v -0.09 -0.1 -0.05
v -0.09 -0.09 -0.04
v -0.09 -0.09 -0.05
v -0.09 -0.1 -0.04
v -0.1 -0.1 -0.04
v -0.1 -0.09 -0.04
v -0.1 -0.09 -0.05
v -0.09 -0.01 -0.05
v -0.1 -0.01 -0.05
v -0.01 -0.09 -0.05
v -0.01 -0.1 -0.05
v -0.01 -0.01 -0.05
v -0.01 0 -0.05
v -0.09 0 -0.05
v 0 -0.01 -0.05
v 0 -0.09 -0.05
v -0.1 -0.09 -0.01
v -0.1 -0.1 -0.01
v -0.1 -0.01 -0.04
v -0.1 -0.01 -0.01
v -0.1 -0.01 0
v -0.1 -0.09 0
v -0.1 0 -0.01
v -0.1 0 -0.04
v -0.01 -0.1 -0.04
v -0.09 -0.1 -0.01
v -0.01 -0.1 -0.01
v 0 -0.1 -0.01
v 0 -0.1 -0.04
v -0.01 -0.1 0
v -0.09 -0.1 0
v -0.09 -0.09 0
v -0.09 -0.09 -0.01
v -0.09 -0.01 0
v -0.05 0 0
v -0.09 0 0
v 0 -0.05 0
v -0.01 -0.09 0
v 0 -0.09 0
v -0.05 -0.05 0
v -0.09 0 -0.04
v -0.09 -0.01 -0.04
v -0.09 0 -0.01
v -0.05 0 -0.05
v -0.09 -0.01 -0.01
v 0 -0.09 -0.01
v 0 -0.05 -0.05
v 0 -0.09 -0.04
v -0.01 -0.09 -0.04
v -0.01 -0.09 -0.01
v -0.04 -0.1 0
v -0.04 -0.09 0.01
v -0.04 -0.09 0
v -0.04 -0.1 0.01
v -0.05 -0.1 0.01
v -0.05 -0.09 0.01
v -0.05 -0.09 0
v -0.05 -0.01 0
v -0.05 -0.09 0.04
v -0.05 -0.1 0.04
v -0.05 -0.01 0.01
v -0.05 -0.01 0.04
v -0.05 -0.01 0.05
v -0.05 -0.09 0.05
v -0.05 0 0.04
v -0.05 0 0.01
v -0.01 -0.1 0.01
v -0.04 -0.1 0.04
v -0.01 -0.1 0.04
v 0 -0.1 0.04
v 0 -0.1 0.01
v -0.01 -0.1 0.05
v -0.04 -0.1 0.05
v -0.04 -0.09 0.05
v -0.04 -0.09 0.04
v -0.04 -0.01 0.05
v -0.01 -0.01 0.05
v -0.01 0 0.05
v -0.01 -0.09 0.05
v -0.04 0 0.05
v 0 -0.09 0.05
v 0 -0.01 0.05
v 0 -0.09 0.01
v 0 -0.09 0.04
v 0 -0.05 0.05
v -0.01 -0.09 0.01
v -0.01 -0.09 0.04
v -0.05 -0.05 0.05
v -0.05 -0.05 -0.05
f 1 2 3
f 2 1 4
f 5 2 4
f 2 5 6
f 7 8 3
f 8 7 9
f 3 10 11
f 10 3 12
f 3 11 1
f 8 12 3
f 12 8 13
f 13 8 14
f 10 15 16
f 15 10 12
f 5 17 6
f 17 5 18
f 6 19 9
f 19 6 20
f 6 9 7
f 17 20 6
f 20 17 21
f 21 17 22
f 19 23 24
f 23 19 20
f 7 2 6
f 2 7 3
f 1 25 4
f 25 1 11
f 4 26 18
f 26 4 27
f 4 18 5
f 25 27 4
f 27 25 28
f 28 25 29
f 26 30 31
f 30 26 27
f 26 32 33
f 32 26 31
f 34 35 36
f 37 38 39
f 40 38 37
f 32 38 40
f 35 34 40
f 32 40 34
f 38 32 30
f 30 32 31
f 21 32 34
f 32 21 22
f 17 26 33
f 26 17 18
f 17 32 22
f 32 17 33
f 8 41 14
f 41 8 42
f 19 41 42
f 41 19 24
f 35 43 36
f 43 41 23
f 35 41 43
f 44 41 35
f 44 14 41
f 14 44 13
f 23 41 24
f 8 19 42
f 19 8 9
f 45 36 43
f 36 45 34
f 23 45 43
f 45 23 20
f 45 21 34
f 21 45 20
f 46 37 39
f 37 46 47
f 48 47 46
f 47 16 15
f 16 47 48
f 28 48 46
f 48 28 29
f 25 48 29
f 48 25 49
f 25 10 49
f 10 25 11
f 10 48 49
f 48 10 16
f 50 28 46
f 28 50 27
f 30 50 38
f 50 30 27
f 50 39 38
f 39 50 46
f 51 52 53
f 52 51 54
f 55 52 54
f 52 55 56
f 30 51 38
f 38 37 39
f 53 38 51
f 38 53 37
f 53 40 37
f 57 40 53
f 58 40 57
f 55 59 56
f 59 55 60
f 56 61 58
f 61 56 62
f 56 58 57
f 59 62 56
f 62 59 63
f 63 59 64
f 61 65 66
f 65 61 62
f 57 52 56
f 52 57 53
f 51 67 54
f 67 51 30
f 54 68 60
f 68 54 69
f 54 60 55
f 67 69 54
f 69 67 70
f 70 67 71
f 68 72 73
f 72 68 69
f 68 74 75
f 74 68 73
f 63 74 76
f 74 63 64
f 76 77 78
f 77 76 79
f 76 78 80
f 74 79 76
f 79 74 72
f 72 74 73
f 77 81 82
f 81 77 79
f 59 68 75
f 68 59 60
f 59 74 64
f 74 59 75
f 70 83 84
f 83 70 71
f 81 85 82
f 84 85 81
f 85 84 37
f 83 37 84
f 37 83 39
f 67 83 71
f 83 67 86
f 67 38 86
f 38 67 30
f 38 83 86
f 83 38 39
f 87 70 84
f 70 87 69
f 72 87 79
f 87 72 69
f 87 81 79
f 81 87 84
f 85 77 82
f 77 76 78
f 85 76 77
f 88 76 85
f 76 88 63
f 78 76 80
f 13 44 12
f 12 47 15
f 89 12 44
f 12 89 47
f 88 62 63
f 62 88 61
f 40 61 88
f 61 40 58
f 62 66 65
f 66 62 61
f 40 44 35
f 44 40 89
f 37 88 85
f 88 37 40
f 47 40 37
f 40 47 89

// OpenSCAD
module chamfered_cube(size, chamfer) {
    difference() {
        cube(size, center=true);
        for (x=[-1,1], y=[-1,1], z=[-1,1]) {
            translate([x*(size[0]/2-chamfer), y*(size[1]/2-chamfer), z*(size[2]/2-chamfer)])
                cube([chamfer*2, chamfer*2, chamfer*2], center=true);
        }
    }
}

module l_shaped_block() {
    difference() {
        union() {
            translate([-0.05, -0.05, -0.025])
                chamfered_cube([0.1, 0.1, 0.05], 0.005);
            translate([-0.025, -0.05, 0.025])
                chamfered_cube([0.05, 0.1, 0.05], 0.005);
        }
        translate([-0.05, -0.05, -0.05])
            cube([0.05, 0.05, 0.1], center=false);
        translate([-0.025, -0.05, 0.025])
            cube([0.05, 0.05, 0.025], center=false);
    }
}

l_shaped_block();
